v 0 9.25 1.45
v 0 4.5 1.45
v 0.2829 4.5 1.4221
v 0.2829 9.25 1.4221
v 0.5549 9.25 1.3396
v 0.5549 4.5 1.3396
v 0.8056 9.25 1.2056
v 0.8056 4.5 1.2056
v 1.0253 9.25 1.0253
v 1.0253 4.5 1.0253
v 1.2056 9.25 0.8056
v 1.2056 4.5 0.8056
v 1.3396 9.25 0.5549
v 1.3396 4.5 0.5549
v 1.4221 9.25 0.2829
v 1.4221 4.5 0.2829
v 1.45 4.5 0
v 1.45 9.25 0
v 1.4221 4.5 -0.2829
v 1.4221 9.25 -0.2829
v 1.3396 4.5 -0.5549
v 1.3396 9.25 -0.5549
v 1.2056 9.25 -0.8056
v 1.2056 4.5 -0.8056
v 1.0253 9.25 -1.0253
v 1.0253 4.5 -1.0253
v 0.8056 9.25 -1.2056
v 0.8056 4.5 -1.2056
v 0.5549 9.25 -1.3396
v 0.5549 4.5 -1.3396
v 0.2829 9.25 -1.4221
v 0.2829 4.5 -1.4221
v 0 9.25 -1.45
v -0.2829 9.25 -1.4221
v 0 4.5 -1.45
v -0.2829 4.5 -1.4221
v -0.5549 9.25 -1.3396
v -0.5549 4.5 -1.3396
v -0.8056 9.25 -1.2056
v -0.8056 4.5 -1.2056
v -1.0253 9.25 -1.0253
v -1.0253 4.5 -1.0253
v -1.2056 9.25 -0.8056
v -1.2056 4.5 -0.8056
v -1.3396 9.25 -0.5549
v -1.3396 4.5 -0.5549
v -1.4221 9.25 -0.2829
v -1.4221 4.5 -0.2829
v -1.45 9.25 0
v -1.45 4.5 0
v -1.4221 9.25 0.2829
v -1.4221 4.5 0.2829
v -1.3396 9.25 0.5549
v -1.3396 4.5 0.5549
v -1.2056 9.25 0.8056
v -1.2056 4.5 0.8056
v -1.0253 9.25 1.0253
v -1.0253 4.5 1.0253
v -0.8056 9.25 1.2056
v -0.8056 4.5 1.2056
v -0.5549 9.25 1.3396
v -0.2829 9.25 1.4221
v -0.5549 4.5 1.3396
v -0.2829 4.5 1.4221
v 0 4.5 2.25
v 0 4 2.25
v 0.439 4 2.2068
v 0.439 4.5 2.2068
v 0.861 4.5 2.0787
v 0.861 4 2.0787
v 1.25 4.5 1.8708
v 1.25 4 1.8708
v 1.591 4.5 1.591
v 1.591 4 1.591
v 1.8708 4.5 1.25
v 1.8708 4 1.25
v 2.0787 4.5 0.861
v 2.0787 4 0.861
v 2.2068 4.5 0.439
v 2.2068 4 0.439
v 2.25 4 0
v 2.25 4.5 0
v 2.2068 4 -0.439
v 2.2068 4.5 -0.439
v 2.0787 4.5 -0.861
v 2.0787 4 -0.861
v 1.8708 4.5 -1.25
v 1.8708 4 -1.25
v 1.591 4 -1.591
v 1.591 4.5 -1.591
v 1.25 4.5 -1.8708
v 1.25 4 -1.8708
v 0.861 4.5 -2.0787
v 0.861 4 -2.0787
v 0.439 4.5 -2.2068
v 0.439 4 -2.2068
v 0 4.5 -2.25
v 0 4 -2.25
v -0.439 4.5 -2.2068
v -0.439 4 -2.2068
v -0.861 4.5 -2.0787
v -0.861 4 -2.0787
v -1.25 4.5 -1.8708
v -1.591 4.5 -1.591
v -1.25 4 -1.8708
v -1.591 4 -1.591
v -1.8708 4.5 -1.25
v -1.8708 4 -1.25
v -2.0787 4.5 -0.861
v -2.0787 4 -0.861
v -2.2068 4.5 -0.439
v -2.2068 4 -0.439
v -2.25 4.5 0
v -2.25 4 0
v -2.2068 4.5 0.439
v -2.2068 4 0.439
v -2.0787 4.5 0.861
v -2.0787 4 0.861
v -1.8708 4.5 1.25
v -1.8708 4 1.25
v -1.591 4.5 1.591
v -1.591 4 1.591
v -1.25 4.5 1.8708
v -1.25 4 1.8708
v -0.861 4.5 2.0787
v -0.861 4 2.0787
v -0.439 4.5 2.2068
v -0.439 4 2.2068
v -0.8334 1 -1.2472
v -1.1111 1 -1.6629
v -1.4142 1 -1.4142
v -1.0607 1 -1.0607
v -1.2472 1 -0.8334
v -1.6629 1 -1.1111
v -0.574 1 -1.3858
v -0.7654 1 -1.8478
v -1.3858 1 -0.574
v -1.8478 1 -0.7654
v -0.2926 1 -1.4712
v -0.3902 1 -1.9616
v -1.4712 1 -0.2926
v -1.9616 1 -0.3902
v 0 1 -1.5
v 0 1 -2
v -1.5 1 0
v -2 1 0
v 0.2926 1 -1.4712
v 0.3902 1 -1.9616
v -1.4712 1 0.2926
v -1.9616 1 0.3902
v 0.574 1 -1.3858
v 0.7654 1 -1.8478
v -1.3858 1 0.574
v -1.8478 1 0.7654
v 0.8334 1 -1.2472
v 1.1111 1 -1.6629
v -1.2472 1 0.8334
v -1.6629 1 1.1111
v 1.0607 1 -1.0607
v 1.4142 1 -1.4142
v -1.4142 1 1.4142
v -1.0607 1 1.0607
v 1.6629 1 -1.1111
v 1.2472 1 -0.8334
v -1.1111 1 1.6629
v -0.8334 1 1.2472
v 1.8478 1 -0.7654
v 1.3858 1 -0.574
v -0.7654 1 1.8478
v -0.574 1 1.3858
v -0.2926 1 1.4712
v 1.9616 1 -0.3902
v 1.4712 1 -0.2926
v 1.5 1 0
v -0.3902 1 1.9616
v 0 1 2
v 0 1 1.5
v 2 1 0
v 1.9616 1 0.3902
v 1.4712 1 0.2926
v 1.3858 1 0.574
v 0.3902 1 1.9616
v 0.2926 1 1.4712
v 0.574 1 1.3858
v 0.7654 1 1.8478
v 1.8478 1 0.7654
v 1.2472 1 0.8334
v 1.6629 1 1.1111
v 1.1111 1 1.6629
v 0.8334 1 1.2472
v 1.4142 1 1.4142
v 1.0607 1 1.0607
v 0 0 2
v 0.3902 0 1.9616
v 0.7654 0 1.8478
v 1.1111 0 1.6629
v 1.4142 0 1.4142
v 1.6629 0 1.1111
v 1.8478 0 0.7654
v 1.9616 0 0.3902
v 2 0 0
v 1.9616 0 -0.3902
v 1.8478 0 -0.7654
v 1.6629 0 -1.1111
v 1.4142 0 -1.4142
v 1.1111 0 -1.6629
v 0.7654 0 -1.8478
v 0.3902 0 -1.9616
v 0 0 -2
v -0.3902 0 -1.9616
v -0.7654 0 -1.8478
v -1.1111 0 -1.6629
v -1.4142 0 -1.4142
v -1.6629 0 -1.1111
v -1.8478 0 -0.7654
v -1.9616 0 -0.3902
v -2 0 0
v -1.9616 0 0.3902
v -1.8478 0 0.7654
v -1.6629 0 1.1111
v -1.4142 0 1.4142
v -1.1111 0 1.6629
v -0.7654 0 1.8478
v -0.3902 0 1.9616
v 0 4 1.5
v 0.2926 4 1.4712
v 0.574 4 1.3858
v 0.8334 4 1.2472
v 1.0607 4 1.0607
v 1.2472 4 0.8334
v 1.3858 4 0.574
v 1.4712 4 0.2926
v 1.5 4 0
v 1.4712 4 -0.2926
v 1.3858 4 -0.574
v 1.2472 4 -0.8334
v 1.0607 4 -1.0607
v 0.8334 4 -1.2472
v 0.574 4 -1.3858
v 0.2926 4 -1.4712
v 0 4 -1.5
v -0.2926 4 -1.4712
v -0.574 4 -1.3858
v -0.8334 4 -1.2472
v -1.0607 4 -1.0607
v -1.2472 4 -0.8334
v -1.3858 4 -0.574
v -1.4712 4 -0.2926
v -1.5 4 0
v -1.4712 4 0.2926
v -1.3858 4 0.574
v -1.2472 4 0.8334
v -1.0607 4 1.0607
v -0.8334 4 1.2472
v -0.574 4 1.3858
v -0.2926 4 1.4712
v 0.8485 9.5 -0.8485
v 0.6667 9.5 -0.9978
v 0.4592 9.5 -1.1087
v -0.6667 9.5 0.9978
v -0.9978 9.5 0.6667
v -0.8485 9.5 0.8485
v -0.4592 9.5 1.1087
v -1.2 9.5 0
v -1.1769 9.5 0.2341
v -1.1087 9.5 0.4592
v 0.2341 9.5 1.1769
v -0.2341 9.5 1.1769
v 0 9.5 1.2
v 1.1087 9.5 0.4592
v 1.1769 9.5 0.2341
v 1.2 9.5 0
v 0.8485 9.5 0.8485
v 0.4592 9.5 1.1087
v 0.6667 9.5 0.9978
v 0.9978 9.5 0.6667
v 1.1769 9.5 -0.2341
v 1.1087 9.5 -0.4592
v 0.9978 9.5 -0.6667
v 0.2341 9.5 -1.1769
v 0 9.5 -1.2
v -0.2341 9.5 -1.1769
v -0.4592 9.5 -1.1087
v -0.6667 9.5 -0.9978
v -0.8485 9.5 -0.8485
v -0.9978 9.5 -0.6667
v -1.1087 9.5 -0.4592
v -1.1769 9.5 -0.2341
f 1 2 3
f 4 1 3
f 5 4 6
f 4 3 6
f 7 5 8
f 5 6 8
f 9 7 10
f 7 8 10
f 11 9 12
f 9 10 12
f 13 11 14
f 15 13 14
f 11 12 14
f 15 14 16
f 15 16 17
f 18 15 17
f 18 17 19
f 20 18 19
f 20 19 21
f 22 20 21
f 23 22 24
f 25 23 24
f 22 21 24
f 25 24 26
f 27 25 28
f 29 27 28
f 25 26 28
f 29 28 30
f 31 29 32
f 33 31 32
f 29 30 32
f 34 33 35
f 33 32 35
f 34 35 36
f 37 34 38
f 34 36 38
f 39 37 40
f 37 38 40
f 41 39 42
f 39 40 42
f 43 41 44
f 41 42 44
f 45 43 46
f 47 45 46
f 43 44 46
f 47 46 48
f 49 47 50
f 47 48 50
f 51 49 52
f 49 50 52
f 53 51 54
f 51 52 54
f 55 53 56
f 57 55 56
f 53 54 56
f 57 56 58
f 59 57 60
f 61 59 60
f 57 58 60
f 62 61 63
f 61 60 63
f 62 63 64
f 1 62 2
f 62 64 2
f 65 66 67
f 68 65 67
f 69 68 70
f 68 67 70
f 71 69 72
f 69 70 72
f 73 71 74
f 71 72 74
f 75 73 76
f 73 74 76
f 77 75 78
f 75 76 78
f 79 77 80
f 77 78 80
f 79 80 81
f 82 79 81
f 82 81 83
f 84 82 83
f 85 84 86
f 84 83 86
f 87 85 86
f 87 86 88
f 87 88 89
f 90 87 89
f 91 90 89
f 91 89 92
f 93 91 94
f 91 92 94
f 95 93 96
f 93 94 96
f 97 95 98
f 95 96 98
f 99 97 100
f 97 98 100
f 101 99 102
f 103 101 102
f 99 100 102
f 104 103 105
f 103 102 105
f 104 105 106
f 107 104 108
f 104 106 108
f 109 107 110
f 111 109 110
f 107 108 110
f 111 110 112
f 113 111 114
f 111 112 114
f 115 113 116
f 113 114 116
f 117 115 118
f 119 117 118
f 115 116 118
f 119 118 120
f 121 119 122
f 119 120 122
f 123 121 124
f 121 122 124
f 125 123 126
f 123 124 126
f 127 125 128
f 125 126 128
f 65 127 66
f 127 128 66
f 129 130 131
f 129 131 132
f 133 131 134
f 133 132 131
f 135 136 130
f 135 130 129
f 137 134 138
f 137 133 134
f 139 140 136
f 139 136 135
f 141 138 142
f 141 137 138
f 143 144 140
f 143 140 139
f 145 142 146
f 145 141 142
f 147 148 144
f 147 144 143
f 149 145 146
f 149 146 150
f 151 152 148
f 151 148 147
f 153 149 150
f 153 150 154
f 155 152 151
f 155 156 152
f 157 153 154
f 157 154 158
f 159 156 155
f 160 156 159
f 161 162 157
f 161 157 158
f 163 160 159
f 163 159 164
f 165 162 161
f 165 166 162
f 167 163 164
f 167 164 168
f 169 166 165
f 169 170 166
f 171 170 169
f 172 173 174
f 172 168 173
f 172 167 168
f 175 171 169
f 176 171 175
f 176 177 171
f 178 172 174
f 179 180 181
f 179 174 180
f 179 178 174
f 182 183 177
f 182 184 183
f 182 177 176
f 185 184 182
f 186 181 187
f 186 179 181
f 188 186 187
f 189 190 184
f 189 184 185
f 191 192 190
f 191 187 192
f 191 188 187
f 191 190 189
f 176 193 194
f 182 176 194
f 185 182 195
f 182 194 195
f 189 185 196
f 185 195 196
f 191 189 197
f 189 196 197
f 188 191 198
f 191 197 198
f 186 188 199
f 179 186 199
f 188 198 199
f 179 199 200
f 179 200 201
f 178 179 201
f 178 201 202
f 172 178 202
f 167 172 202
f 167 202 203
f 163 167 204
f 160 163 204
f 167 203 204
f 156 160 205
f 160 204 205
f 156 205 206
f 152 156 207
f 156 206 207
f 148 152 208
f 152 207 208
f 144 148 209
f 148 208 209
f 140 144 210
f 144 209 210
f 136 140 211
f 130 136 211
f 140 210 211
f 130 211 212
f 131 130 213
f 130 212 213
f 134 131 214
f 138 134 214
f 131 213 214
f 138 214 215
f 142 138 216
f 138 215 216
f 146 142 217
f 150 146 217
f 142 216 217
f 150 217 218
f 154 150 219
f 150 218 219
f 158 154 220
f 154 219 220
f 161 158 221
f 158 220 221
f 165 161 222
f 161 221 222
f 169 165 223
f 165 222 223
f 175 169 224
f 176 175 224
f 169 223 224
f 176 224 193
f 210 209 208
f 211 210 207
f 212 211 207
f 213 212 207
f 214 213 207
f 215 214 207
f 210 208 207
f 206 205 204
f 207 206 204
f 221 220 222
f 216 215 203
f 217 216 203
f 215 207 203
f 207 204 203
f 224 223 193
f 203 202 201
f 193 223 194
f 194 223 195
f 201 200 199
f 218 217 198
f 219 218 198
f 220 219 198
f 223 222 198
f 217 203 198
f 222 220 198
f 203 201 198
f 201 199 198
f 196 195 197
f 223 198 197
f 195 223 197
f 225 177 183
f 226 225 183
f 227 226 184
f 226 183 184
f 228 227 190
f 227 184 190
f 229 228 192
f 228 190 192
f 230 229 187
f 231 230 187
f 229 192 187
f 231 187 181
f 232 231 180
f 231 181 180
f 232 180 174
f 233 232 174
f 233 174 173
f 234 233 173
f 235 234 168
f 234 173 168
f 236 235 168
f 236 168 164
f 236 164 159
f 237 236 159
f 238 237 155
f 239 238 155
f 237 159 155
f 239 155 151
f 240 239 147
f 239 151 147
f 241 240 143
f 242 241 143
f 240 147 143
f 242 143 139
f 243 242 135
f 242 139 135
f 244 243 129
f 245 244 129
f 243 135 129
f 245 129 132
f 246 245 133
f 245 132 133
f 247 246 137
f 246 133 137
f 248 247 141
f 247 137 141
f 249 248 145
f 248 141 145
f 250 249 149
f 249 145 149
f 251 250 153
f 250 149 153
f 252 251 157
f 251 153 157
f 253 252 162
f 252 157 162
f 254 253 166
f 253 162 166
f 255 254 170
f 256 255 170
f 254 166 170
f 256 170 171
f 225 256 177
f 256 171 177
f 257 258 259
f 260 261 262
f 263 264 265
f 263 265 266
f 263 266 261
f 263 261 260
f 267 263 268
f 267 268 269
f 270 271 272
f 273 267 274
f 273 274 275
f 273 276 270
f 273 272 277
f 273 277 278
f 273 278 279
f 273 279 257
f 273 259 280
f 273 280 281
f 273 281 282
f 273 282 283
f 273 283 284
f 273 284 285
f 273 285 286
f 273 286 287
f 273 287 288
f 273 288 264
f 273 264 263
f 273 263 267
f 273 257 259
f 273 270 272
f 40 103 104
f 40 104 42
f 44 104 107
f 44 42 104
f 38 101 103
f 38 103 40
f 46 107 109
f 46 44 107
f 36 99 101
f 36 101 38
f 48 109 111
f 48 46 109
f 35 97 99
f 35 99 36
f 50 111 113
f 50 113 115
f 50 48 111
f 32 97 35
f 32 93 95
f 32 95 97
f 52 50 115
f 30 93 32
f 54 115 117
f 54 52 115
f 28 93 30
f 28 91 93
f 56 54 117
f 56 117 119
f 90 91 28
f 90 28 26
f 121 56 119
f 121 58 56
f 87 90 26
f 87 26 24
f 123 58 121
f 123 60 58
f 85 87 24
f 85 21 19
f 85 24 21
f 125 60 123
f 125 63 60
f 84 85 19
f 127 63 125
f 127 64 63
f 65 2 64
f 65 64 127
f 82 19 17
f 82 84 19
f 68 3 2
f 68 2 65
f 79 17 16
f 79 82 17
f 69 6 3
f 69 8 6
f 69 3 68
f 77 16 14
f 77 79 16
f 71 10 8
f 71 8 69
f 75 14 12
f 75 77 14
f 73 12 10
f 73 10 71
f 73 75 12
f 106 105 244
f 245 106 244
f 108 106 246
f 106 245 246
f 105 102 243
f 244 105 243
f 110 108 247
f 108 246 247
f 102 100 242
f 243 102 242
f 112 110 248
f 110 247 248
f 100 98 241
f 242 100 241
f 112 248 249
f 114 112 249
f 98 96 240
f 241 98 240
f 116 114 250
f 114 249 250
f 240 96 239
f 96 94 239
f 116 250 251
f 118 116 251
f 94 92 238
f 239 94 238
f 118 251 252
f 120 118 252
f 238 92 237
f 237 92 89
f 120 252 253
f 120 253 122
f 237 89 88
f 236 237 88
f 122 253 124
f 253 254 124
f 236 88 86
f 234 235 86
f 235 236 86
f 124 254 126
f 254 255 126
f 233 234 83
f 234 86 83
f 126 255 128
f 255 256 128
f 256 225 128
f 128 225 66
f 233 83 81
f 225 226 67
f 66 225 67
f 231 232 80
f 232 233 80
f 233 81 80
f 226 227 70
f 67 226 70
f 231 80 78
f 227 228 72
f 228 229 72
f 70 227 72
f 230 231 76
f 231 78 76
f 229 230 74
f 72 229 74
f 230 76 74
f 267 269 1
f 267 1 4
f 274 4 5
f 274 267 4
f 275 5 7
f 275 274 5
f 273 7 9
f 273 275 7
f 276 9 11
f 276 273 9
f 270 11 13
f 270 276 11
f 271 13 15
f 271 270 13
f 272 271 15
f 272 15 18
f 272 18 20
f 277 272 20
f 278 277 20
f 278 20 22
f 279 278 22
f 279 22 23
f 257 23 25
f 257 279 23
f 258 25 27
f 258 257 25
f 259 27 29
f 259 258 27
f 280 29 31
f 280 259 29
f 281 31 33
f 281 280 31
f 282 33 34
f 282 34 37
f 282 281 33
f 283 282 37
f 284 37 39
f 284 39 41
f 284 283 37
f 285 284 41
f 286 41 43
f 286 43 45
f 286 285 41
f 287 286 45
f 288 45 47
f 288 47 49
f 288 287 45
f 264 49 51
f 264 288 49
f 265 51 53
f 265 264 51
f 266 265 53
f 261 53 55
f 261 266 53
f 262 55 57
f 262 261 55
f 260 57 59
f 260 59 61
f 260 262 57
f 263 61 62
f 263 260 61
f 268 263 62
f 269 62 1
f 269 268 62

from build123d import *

# Parameters (mm, degrees)
SKETCH2_R           = 2
BOSS_EXTRUDE1_DEPTH = 1
SKETCH3_R           = 1.5
BOSS_EXTRUDE2_DEPTH = 3
SKETCH4_R           = 2.25
BOSS_EXTRUDE3_DEPTH = 0.5
SKETCH5_R           = 1.45
BOSS_EXTRUDE4_DEPTH = 5
CHAMFER3_SIZE       = 0.25


with BuildPart() as part:
    # Sketch2 → Boss-Extrude1 (new body)
    with BuildSketch(Plane(origin=(0, 0, 0), x_dir=(1, 0, 0), z_dir=(0, 1, 0))):
        with Locations(Location((0, 0, 0), (0, 0, 270))):
            Circle(SKETCH2_R)
    extrude(amount=BOSS_EXTRUDE1_DEPTH)

    # Sketch3 → Boss-Extrude2 (add)
    with BuildSketch(Plane(origin=(0, 1, 0), x_dir=(1, 0, 0), z_dir=(0, 1, 0))):
        with Locations(Location((0, 0, 0), (0, 0, 270))):
            Circle(SKETCH3_R)
    extrude(amount=BOSS_EXTRUDE2_DEPTH)

    # Sketch4 → Boss-Extrude3 (add)
    with BuildSketch(Plane(origin=(0, 4, 0), x_dir=(1, 0, 0), z_dir=(0, 1, 0))):
        with Locations(Location((0, 0, 0), (0, 0, 270))):
            Circle(SKETCH4_R)
    extrude(amount=BOSS_EXTRUDE3_DEPTH)

    # Sketch5 → Boss-Extrude4 (add)
    with BuildSketch(Plane(origin=(0, 4.5, 0), x_dir=(1, 0, 0), z_dir=(0, 1, 0))):
        with Locations(Location((0, 0, 0), (0, 0, 270))):
            Circle(SKETCH5_R)
    extrude(amount=BOSS_EXTRUDE4_DEPTH)

    # Chamfer3
    chamfer3_edges = [part.edges().sort_by_distance(p)[0] for p in [
        (0, 9.5, -1.45),
    ]]
    chamfer(chamfer3_edges, length=CHAMFER3_SIZE)


solid = part.part
